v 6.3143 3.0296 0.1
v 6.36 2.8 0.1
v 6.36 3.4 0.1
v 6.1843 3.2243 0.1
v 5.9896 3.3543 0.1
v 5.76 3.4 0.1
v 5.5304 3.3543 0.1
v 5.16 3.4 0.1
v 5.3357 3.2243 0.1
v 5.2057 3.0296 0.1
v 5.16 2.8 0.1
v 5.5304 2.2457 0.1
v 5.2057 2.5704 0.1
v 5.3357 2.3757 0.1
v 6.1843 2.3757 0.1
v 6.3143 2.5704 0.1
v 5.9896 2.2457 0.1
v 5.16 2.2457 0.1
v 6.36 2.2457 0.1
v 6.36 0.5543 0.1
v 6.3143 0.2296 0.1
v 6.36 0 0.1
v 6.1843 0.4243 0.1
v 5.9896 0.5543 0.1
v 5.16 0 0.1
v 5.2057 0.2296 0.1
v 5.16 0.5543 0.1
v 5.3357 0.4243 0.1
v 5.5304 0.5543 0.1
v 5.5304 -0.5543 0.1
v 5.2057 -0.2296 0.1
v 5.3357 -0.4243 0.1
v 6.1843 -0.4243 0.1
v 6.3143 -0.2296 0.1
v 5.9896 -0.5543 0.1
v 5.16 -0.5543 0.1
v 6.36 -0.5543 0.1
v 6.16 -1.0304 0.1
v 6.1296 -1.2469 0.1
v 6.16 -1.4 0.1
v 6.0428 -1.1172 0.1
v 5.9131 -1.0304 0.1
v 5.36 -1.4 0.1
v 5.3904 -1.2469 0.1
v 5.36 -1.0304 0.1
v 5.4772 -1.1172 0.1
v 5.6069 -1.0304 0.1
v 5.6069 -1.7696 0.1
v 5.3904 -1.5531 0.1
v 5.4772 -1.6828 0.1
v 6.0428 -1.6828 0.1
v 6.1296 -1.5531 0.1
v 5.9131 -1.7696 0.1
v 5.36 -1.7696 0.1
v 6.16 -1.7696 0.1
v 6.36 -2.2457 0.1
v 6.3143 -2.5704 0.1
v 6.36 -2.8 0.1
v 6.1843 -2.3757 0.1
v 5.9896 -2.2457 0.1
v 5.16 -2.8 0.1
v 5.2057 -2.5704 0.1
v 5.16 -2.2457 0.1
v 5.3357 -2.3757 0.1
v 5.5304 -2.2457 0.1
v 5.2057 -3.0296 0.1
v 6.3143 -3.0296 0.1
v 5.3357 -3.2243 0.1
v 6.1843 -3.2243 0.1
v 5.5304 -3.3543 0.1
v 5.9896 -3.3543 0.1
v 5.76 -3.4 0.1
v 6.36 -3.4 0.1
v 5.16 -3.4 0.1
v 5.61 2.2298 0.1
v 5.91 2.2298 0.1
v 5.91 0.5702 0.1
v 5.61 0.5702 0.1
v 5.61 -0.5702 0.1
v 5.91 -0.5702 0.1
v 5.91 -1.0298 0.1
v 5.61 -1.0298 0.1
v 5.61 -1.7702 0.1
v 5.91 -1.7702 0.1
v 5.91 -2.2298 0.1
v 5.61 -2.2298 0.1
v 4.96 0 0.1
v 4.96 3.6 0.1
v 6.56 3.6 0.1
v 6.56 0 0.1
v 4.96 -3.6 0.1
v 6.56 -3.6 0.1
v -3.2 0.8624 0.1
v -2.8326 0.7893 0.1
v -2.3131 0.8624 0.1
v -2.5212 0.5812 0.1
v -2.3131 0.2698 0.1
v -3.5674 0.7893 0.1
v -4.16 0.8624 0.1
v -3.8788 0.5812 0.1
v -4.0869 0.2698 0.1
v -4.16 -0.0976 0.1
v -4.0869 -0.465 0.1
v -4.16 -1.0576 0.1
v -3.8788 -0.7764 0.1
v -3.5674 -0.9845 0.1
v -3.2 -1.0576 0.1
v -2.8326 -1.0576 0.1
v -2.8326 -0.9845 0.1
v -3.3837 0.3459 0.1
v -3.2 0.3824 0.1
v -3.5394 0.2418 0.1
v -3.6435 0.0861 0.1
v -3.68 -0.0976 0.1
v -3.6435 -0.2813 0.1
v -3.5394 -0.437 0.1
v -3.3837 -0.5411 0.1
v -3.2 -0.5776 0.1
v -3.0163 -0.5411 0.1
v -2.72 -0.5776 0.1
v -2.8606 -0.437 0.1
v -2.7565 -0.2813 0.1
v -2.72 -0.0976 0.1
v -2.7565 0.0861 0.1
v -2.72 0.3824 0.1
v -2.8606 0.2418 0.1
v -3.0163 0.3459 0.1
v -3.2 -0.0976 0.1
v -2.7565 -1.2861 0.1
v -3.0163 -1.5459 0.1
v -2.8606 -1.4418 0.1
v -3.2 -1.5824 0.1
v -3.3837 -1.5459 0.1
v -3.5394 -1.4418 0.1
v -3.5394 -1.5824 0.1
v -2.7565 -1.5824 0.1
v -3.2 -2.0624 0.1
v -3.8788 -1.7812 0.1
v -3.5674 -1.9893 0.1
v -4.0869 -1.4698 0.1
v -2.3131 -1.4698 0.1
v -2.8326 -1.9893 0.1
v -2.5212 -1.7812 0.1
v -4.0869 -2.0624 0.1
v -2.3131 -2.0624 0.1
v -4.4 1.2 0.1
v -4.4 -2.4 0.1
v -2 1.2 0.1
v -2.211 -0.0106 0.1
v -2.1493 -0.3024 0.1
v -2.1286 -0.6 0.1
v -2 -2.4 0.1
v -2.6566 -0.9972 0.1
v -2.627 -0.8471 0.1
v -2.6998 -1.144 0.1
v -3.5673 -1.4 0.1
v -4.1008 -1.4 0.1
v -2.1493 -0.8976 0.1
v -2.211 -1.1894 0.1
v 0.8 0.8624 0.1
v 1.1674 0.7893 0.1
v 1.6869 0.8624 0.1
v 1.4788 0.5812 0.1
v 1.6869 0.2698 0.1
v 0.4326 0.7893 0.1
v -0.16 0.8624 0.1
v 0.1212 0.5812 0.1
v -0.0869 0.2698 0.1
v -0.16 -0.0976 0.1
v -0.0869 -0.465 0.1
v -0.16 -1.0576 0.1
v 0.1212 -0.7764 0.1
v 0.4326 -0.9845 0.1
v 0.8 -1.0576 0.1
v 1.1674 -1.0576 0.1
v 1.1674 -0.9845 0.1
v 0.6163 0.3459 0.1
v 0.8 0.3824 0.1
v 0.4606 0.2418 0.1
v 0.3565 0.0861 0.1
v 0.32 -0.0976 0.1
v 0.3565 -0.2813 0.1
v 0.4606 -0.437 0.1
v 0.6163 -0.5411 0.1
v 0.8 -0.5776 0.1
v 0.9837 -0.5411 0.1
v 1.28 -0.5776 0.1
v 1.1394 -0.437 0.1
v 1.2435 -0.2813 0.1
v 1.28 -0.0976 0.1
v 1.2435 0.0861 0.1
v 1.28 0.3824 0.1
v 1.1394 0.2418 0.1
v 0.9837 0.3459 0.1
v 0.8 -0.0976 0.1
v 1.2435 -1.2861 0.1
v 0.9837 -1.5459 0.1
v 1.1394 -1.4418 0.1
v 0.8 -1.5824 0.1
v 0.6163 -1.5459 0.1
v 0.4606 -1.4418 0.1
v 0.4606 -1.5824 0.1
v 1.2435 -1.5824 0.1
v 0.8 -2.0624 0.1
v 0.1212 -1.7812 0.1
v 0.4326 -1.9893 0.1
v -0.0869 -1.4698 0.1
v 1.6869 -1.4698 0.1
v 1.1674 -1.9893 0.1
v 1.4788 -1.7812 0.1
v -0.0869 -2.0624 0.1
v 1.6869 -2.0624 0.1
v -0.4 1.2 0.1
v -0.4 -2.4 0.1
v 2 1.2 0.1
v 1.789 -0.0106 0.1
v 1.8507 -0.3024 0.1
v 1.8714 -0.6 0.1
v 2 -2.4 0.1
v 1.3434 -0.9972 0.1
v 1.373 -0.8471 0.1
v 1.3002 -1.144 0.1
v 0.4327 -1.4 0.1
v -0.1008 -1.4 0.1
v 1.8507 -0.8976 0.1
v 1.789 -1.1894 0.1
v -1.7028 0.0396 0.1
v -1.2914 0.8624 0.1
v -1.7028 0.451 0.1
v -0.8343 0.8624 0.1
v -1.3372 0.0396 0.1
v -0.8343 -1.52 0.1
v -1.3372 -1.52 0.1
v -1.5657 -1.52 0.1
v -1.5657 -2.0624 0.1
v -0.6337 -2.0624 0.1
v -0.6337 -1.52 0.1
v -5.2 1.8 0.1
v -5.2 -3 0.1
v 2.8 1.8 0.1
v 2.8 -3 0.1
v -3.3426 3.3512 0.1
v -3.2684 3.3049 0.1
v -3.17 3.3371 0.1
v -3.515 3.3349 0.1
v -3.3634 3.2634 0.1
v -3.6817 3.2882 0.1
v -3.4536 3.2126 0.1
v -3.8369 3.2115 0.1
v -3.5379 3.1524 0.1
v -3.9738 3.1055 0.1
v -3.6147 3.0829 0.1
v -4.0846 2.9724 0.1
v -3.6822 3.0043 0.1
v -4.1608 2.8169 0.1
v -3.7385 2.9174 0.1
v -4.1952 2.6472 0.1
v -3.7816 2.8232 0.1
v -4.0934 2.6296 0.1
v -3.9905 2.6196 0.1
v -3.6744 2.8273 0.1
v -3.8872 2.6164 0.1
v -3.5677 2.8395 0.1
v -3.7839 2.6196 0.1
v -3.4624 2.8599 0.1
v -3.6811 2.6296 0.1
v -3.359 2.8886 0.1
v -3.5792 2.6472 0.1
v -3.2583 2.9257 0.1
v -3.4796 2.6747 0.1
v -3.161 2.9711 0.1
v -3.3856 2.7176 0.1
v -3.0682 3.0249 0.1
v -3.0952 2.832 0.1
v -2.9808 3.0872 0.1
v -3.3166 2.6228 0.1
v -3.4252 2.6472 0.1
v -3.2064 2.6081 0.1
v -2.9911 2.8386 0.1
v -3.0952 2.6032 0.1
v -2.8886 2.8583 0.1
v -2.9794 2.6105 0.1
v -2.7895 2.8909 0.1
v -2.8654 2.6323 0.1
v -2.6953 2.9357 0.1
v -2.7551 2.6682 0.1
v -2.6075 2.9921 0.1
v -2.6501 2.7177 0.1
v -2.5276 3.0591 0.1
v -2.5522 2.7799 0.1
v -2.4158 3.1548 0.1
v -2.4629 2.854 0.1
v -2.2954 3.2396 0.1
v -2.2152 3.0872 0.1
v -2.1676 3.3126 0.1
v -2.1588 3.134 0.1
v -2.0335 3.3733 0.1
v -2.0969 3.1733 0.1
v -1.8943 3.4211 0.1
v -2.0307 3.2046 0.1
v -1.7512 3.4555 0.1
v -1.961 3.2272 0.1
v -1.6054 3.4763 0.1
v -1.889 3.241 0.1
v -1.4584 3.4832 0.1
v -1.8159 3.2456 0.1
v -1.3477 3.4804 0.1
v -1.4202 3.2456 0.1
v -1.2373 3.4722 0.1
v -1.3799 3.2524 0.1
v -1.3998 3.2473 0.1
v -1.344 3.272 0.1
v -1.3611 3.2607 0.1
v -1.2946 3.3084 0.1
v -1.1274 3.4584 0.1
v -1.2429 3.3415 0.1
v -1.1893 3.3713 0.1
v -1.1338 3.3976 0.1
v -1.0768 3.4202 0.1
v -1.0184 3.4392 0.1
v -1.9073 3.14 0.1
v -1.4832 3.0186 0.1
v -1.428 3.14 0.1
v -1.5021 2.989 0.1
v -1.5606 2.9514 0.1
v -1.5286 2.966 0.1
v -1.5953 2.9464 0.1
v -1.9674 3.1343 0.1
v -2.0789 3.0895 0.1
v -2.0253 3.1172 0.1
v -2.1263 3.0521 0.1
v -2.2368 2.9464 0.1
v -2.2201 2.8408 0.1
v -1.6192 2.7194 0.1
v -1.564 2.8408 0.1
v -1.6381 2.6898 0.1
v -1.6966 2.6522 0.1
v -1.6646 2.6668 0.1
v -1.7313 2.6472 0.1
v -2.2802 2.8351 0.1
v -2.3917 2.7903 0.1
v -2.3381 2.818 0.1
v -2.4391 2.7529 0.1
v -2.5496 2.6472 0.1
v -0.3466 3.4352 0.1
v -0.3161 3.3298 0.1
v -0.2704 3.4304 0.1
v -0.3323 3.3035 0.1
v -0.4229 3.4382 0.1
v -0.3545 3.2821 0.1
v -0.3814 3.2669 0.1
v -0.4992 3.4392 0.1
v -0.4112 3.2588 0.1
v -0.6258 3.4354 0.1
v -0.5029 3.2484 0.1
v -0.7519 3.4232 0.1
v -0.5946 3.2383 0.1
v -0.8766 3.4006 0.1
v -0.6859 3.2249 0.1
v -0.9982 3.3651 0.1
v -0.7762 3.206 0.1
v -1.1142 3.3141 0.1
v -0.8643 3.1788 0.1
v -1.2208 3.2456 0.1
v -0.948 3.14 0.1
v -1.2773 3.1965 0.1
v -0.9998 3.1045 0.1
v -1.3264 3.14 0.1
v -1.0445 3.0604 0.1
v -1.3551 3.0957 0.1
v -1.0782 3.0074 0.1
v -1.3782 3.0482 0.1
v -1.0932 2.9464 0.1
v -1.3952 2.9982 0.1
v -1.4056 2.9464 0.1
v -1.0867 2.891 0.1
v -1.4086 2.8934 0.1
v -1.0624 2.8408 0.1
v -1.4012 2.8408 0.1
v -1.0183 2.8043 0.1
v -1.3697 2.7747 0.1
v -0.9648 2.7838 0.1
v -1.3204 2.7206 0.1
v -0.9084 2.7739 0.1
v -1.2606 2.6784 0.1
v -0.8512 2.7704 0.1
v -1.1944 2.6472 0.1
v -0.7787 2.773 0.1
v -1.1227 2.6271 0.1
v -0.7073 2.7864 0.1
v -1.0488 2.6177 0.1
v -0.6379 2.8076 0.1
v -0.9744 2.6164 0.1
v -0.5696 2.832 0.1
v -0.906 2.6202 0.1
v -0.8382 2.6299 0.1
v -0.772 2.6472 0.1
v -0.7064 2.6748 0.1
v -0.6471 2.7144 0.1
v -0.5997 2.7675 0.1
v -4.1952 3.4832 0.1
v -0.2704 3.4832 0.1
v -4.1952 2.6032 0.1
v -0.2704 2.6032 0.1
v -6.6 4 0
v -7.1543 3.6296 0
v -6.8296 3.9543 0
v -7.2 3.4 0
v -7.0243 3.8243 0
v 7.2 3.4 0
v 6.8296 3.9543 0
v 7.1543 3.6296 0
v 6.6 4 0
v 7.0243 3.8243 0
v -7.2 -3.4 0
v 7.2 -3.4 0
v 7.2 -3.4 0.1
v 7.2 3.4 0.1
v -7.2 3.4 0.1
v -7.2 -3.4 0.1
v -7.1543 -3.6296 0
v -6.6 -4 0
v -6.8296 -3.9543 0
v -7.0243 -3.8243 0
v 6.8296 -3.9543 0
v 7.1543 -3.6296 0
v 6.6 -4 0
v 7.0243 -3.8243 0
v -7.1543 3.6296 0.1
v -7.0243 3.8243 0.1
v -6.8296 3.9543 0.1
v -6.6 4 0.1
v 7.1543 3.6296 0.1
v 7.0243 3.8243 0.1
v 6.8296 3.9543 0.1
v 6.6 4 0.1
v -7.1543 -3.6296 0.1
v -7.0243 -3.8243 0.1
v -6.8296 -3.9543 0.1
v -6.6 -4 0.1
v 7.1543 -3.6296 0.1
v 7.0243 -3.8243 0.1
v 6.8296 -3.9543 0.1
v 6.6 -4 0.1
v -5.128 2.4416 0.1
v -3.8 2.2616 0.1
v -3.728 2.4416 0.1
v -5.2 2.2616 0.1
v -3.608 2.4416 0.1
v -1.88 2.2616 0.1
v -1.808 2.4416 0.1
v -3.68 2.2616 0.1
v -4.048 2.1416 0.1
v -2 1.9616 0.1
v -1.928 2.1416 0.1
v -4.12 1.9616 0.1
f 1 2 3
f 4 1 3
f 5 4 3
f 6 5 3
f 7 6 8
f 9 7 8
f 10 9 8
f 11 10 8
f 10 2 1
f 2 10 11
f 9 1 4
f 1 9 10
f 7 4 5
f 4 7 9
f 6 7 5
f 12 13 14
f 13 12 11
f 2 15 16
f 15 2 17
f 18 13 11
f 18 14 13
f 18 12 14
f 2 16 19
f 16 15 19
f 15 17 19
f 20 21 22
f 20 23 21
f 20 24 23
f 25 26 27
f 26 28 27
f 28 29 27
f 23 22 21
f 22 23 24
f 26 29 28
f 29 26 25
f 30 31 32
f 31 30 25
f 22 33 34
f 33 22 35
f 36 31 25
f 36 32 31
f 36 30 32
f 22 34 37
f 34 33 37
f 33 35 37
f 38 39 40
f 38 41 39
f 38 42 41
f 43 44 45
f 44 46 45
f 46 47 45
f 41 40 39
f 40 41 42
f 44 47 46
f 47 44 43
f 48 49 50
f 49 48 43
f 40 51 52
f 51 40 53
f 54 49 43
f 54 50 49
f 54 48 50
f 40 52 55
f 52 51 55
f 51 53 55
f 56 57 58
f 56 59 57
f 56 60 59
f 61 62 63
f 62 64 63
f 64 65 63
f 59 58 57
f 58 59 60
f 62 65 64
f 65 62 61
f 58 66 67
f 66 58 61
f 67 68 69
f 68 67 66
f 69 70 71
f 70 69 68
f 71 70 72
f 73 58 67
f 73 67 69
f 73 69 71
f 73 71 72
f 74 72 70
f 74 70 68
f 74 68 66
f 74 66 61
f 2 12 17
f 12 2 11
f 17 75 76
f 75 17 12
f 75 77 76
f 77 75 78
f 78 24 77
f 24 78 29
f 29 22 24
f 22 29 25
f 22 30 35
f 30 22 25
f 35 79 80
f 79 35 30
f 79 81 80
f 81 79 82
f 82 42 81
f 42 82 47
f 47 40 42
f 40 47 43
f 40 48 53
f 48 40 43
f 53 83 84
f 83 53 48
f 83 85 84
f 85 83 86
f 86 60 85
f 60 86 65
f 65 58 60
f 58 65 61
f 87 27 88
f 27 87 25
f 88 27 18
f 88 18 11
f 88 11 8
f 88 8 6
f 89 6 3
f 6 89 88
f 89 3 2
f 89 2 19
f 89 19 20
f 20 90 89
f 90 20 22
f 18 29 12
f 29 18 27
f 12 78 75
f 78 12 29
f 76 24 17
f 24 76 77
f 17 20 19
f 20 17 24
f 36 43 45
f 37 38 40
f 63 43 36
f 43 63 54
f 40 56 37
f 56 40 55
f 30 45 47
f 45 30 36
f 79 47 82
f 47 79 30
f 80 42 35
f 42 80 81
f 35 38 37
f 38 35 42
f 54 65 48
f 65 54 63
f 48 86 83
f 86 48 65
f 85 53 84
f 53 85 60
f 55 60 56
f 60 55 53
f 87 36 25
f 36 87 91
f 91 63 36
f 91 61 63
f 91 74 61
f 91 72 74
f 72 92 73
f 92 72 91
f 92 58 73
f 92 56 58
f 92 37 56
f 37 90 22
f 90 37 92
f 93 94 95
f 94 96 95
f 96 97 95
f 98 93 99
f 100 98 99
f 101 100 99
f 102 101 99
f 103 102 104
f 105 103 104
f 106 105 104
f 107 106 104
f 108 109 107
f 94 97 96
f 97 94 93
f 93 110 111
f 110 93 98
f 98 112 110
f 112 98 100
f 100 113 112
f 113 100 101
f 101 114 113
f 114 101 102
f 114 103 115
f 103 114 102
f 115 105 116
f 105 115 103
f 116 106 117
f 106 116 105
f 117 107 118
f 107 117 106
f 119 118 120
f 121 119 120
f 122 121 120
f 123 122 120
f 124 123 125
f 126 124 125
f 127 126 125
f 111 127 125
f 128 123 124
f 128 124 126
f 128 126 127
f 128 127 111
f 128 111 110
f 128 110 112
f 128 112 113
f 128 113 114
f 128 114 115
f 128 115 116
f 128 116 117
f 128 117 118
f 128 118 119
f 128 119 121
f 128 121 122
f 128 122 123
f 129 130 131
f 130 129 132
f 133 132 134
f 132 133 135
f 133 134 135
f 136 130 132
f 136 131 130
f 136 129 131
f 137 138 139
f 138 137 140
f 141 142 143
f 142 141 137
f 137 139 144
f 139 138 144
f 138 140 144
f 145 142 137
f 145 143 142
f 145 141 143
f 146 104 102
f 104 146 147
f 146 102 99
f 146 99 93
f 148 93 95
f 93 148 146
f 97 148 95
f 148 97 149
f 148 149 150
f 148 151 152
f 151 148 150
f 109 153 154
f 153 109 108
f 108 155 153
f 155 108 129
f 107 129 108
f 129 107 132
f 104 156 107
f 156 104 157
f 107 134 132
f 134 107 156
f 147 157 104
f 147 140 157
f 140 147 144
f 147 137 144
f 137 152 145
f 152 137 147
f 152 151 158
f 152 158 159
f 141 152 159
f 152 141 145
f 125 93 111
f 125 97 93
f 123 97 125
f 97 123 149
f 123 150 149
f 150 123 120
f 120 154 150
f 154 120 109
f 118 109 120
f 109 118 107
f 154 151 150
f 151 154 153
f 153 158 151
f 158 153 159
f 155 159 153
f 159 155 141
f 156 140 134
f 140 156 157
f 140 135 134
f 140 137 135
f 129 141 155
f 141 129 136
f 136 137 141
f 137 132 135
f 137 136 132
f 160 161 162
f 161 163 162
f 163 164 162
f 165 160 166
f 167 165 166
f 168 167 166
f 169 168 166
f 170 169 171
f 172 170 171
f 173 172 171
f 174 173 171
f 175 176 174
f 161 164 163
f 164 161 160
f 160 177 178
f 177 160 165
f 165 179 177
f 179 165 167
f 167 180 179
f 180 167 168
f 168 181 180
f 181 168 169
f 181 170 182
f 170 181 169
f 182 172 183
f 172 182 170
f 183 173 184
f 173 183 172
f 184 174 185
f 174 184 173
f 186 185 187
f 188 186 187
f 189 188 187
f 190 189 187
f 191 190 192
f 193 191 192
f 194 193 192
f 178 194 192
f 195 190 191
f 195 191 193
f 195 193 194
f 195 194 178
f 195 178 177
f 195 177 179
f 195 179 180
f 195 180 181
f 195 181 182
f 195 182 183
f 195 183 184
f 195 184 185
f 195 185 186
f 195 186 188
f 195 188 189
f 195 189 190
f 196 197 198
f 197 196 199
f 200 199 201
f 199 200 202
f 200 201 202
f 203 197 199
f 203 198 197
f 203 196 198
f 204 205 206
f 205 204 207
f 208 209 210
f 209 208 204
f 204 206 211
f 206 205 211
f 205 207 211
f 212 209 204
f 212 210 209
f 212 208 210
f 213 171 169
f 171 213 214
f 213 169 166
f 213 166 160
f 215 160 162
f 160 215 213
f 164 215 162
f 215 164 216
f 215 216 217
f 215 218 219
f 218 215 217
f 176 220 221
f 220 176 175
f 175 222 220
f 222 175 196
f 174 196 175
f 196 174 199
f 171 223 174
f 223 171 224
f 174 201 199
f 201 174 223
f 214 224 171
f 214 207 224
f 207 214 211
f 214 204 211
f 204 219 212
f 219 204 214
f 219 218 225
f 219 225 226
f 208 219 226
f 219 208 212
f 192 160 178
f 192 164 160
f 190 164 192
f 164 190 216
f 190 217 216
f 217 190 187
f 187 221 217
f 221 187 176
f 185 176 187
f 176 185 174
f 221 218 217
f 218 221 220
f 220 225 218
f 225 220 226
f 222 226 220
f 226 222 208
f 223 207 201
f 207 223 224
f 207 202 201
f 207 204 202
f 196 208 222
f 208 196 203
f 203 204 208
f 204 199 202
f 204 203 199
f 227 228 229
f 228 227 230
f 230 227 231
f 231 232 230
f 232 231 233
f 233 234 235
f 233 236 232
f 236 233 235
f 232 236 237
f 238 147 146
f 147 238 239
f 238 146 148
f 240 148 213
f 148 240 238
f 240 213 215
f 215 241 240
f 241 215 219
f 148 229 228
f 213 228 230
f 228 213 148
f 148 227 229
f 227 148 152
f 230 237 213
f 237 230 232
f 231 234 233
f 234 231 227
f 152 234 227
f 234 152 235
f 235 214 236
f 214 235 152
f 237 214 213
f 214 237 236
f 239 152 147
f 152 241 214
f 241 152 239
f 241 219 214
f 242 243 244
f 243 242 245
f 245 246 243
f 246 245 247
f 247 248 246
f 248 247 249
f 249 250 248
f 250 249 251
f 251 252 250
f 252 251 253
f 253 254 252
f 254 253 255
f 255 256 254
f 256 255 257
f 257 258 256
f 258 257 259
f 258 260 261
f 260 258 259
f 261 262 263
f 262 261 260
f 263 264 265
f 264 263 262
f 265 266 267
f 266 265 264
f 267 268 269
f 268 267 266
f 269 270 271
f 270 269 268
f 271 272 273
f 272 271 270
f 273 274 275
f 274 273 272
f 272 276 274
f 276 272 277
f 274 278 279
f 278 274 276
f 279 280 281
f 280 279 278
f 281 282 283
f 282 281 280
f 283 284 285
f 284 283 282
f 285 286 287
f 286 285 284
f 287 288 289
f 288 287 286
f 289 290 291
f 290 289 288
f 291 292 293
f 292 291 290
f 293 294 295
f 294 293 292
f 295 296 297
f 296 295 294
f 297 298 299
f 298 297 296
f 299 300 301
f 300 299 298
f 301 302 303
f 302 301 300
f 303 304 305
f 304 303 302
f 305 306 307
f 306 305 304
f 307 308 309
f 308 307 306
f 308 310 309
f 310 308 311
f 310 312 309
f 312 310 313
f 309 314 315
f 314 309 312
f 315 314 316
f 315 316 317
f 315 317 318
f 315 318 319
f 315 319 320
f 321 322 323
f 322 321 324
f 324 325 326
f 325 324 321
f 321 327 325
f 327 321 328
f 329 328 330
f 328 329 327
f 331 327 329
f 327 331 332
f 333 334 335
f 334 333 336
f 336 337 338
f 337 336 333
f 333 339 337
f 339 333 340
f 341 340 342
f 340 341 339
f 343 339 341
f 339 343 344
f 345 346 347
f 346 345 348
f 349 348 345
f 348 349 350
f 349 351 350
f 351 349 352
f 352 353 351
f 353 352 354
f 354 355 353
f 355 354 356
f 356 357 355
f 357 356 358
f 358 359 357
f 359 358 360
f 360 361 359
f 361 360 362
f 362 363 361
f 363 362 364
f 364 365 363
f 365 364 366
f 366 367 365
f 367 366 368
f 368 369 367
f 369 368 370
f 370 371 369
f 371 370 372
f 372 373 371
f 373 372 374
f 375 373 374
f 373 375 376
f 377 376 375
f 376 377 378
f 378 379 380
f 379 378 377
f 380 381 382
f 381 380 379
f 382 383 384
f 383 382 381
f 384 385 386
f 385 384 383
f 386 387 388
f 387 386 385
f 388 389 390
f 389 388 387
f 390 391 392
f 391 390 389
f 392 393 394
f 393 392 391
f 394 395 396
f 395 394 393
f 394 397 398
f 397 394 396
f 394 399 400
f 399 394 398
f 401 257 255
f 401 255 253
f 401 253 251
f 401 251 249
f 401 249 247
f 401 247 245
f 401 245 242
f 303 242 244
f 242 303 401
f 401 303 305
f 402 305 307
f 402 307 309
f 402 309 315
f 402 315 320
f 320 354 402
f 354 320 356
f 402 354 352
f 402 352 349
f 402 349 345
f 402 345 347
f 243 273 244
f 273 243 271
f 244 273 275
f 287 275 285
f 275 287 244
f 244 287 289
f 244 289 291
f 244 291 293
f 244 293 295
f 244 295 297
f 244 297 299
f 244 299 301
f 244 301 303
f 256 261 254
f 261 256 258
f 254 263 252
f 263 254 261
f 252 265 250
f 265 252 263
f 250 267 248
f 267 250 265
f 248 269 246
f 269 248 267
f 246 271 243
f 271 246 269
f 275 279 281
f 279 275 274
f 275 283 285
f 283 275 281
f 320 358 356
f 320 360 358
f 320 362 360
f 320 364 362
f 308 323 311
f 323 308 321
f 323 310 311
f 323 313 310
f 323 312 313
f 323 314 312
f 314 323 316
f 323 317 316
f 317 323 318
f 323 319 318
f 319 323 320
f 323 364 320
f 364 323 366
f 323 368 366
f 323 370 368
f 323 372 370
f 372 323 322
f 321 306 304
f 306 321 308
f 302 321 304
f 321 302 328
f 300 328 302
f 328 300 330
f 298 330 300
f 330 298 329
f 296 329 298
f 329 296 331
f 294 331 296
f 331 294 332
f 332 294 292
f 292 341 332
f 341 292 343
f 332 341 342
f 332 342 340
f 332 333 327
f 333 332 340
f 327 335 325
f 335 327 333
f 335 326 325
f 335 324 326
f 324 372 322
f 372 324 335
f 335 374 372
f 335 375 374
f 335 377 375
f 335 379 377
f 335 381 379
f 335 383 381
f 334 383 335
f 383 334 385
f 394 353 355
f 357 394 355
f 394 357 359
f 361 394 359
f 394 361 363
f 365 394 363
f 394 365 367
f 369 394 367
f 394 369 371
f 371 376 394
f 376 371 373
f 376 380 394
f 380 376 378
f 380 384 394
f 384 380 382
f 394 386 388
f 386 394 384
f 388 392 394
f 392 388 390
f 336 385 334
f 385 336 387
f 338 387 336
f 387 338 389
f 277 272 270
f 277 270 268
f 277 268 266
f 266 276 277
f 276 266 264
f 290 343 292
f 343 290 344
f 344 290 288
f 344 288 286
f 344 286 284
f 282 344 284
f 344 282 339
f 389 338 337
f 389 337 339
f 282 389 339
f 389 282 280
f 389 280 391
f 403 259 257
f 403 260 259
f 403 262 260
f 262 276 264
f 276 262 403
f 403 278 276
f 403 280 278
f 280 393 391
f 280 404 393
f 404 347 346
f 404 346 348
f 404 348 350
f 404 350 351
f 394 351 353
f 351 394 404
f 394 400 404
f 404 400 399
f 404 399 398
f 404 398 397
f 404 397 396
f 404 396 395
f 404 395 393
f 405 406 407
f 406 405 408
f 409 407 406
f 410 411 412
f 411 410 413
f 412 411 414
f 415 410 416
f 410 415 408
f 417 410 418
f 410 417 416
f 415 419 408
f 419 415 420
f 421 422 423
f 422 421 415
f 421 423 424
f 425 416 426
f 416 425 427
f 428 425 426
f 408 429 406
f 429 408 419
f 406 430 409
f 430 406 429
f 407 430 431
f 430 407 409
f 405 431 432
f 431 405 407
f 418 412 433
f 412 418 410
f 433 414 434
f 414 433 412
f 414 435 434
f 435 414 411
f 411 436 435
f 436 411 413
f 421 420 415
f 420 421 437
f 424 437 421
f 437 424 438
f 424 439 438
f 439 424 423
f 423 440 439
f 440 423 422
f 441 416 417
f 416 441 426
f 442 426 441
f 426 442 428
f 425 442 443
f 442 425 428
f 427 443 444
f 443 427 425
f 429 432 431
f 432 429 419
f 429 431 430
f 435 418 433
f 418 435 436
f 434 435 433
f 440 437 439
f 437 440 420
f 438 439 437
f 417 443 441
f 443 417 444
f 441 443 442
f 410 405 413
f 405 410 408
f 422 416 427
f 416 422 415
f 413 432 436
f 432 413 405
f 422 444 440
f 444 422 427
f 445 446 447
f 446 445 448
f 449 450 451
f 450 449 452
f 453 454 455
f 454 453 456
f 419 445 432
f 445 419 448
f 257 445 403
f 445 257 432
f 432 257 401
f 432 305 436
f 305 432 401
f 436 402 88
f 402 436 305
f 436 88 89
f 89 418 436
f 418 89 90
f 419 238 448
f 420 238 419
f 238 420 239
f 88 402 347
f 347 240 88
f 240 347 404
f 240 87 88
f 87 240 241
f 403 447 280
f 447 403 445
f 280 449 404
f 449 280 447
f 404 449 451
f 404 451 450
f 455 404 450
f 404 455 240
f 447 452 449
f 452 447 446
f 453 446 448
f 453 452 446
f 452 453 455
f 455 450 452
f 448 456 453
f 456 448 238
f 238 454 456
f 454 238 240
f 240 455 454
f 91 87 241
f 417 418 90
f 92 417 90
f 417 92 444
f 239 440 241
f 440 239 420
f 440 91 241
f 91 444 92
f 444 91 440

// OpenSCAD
use <../lib.scad>
use <../p/1-4chrd.scad>
use <../p/1-4cyli.scad>
use <../p/box3u12.scad>
use <../p/logo-wec-box.scad>
use <../p/logo-wec-text.scad>
use <s/6148328bss01.scad>
use <s/6148328bss02.scad>
function ldraw_lib__6148328bt() = [
// 0 Sticker  1.0 x  1.8 with White "919" in Red Square on White Background Right
// 0 Name: 6148328bt.dat
// 0 Author: Massimo Maso [Sirio]
// 0 !LDRAW_ORG Part UPDATE 2024-08
// 0 !LICENSE Licensed under CC BY 4.0 : see CAreadme.txt
// 
// 0 BFC CERTIFY CCW
  [0,"BFC","CERTIFY"],
  [0,"BFC","CCW"],
// 
// 0 !KEYWORDS 919, Bricklink 75876stk01, Brickowl 852010, Hybrid, Pit Lane
// 0 !KEYWORDS Porsche, Rebrickable 26357, set 75876, Speed Champions
// 
// 0 !HISTORY 2024-09-30 [OrionP] Official Update 2024-08
// 
// 0 // Subparts
// 1 15 14.4 -.25 0 1 0 0 0 1 0 0 0 1 s\6148328bss01.dat
  [1,15,14.4,-.25,0,1,0,0,0,1,0,0,0,1, ldraw_lib__s__6148328bss01()],
// 1 15 -3 -.25 -1.5 1 0 0 0 1 0 0 0 1 s\6148328bss02.dat
  [1,15,-3,-.25,-1.5,1,0,0,0,1,0,0,0,1, ldraw_lib__s__6148328bss02()],
// 0 // Logo primitive
// 1 0 -5.582 -.25 7.608 .22 0 0 0 1 0 0 0 .22 logo-wec-text.dat
  [1,0,-5.582,-.25,7.608,.22,0,0,0,1,0,0,0,.22, ldraw_lib__logo_wec_text()],
// 1 15 -5.582 -.25 7.608 .22 0 0 0 1 0 0 0 .22 logo-wec-box.dat
  [1,15,-5.582,-.25,7.608,.22,0,0,0,1,0,0,0,.22, ldraw_lib__logo_wec_box()],
// 0 // Primitives
// 1 16 -16.5 0 8.5 -1.5 0 0 0 -1 0 0 0 1.5 1-4chrd.dat
  [1,16,-16.5,0,8.5,-1.5,0,0,0,-1,0,0,0,1.5, ldraw_lib__1_4chrd()],
// 1 16 16.5 0 8.5 1.5 0 0 0 -1 0 0 0 1.5 1-4chrd.dat
  [1,16,16.5,0,8.5,1.5,0,0,0,-1,0,0,0,1.5, ldraw_lib__1_4chrd()],
// 1 16 0 -.25 0 0 0 18 0 .25 0 8.5 0 0 box3u12.dat
  [1,16,0,-.25,0,0,0,18,0,.25,0,8.5,0,0, ldraw_lib__box3u12()],
// 1 16 -16.5 0 -8.5 -1.5 0 0 0 -1 0 0 0 -1.5 1-4chrd.dat
  [1,16,-16.5,0,-8.5,-1.5,0,0,0,-1,0,0,0,-1.5, ldraw_lib__1_4chrd()],
// 1 16 16.5 0 -8.5 1.5 0 0 0 -1 0 0 0 -1.5 1-4chrd.dat
  [1,16,16.5,0,-8.5,1.5,0,0,0,-1,0,0,0,-1.5, ldraw_lib__1_4chrd()],
// 1 16 -16.5 0 8.5 -1.5 0 0 0 -.25 0 0 0 1.5 1-4cyli.dat
  [1,16,-16.5,0,8.5,-1.5,0,0,0,-.25,0,0,0,1.5, ldraw_lib__1_4cyli()],
// 1 16 16.5 0 8.5 1.5 0 0 0 -.25 0 0 0 1.5 1-4cyli.dat
  [1,16,16.5,0,8.5,1.5,0,0,0,-.25,0,0,0,1.5, ldraw_lib__1_4cyli()],
// 1 16 -16.5 0 -8.5 -1.5 0 0 0 -.25 0 0 0 -1.5 1-4cyli.dat
  [1,16,-16.5,0,-8.5,-1.5,0,0,0,-.25,0,0,0,-1.5, ldraw_lib__1_4cyli()],
// 1 16 16.5 0 -8.5 1.5 0 0 0 -.25 0 0 0 -1.5 1-4cyli.dat
  [1,16,16.5,0,-8.5,1.5,0,0,0,-.25,0,0,0,-1.5, ldraw_lib__1_4cyli()],
// 1 15 -16.5 -.25 8.5 -1.5 0 0 0 1 0 0 0 1.5 1-4chrd.dat
  [1,15,-16.5,-.25,8.5,-1.5,0,0,0,1,0,0,0,1.5, ldraw_lib__1_4chrd()],
// 1 15 16.5 -.25 8.5 1.5 0 0 0 1 0 0 0 1.5 1-4chrd.dat
  [1,15,16.5,-.25,8.5,1.5,0,0,0,1,0,0,0,1.5, ldraw_lib__1_4chrd()],
// 1 15 -16.5 -.25 -8.5 -1.5 0 0 0 1 0 0 0 -1.5 1-4chrd.dat
  [1,15,-16.5,-.25,-8.5,-1.5,0,0,0,1,0,0,0,-1.5, ldraw_lib__1_4chrd()],
// 1 15 16.5 -.25 -8.5 1.5 0 0 0 1 0 0 0 -1.5 1-4chrd.dat
  [1,15,16.5,-.25,-8.5,1.5,0,0,0,1,0,0,0,-1.5, ldraw_lib__1_4chrd()],
// 0 // Bottom faces
// 4 16 16.5 0 10 18 0 8.5 -18 0 8.5 -16.5 0 10
  [4,16,16.5,0,10,18,0,8.5,-18,0,8.5,-16.5,0,10],
// 4 16 16.5 0 -10 -16.5 0 -10 -18 0 -8.5 18 0 -8.5
  [4,16,16.5,0,-10,-16.5,0,-10,-18,0,-8.5,18,0,-8.5],
// 0 // Lateral faces
// 4 16 -16.5 0 10 -16.5 -.25 10 16.5 -.25 10 16.5 0 10
  [4,16,-16.5,0,10,-16.5,-.25,10,16.5,-.25,10,16.5,0,10],
// 4 16 -16.5 0 -10 16.5 0 -10 16.5 -.25 -10 -16.5 -.25 -10
  [4,16,-16.5,0,-10,16.5,0,-10,16.5,-.25,-10,-16.5,-.25,-10],
// 0 // Top faces
// 0 // Black faces
// 4 0 -12.82 -.25 6.104 -13 -.25 5.654 -9.5 -.25 5.654 -9.32 -.25 6.104
  [4,0,-12.82,-.25,6.104,-13,-.25,5.654,-9.5,-.25,5.654,-9.32,-.25,6.104],
// 4 0 -9.02 -.25 6.104 -9.2 -.25 5.654 -4.7 -.25 5.654 -4.52 -.25 6.104
  [4,0,-9.02,-.25,6.104,-9.2,-.25,5.654,-4.7,-.25,5.654,-4.52,-.25,6.104],
// 4 0 -10.12 -.25 5.354 -10.3 -.25 4.904 -5 -.25 4.904 -4.82 -.25 5.354
  [4,0,-10.12,-.25,5.354,-10.3,-.25,4.904,-5,-.25,4.904,-4.82,-.25,5.354],
// 0 // White faces
// 4 15 -16.5 -.25 10 -18 -.25 8.5 -13 -.25 5.654 -12.82 -.25 6.104
  [4,15,-16.5,-.25,10,-18,-.25,8.5,-13,-.25,5.654,-12.82,-.25,6.104],
// 4 15 -16.5 -.25 10 -12.82 -.25 6.104 -10.488 -.25 6.508 -10.488 -.25 6.618
  [4,15,-16.5,-.25,10,-12.82,-.25,6.104,-10.488,-.25,6.508,-10.488,-.25,6.618],
// 3 15 -16.5 -.25 10 -10.488 -.25 6.618 -10.488 -.25 8.708
  [3,15,-16.5,-.25,10,-10.488,-.25,6.618,-10.488,-.25,8.708],
// 4 15 -16.5 -.25 10 -10.488 -.25 8.708 -3.646 -.25 8.708 16.5 -.25 10
  [4,15,-16.5,-.25,10,-10.488,-.25,8.708,-3.646,-.25,8.708,16.5,-.25,10],
// 4 15 16.5 -.25 10 -3.646 -.25 8.708 -.676 -.25 8.708 12.4 -.25 9
  [4,15,16.5,-.25,10,-3.646,-.25,8.708,-.676,-.25,8.708,12.4,-.25,9],
// 3 15 16.5 -.25 10 12.4 -.25 9 16.4 -.25 9
  [3,15,16.5,-.25,10,12.4,-.25,9,16.4,-.25,9],
// 4 15 16.5 -.25 10 16.4 -.25 9 16.4 -.25 0 18 -.25 8.5
  [4,15,16.5,-.25,10,16.4,-.25,9,16.4,-.25,0,18,-.25,8.5],
// 3 15 -18 -.25 8.5 -13 -.25 4.5 -13 -.25 5.654
  [3,15,-18,-.25,8.5,-13,-.25,4.5,-13,-.25,5.654],
// 4 15 -18 -.25 8.5 -18 -.25 -8.5 -13 -.25 -7.5 -13 -.25 4.5
  [4,15,-18,-.25,8.5,-18,-.25,-8.5,-13,-.25,-7.5,-13,-.25,4.5],
// 3 15 12.4 -.25 9 -.676 -.25 8.708 -.676 -.25 8.576
  [3,15,12.4,-.25,9,-.676,-.25,8.708,-.676,-.25,8.576],
// 4 15 12.4 -.25 9 -.676 -.25 8.576 -.676 -.25 6.508 7 -.25 4.5
  [4,15,12.4,-.25,9,-.676,-.25,8.576,-.676,-.25,6.508,7,-.25,4.5],
// 4 15 12.4 -.25 9 7 -.25 4.5 7 -.25 -7.5 12.4 -.25 0
  [4,15,12.4,-.25,9,7,-.25,4.5,7,-.25,-7.5,12.4,-.25,0],
// 4 15 -10.488 -.25 6.508 -12.82 -.25 6.104 -9.32 -.25 6.104 -7.738 -.25 6.508
  [4,15,-10.488,-.25,6.508,-12.82,-.25,6.104,-9.32,-.25,6.104,-7.738,-.25,6.508],
// 4 15 -7.738 -.25 6.508 -9.32 -.25 6.104 -9.02 -.25 6.104 -.676 -.25 6.508
  [4,15,-7.738,-.25,6.508,-9.32,-.25,6.104,-9.02,-.25,6.104,-.676,-.25,6.508],
// 3 15 -.676 -.25 6.508 -9.02 -.25 6.104 -4.52 -.25 6.104
  [3,15,-.676,-.25,6.508,-9.02,-.25,6.104,-4.52,-.25,6.104],
// 3 15 -.676 -.25 6.508 -4.52 -.25 6.104 -4.7 -.25 5.654
  [3,15,-.676,-.25,6.508,-4.52,-.25,6.104,-4.7,-.25,5.654],
// 4 15 -.676 -.25 6.508 -4.7 -.25 5.654 -4.82 -.25 5.354 7 -.25 4.5
  [4,15,-.676,-.25,6.508,-4.7,-.25,5.654,-4.82,-.25,5.354,7,-.25,4.5],
// 4 15 -9.32 -.25 6.104 -9.5 -.25 5.654 -9.2 -.25 5.654 -9.02 -.25 6.104
  [4,15,-9.32,-.25,6.104,-9.5,-.25,5.654,-9.2,-.25,5.654,-9.02,-.25,6.104],
// 3 15 -10.12 -.25 5.354 -9.5 -.25 5.654 -13 -.25 5.654
  [3,15,-10.12,-.25,5.354,-9.5,-.25,5.654,-13,-.25,5.654],
// 4 15 -10.12 -.25 5.354 -4.82 -.25 5.354 -9.2 -.25 5.654 -9.5 -.25 5.654
  [4,15,-10.12,-.25,5.354,-4.82,-.25,5.354,-9.2,-.25,5.654,-9.5,-.25,5.654],
// 3 15 -4.82 -.25 5.354 -4.7 -.25 5.654 -9.2 -.25 5.654
  [3,15,-4.82,-.25,5.354,-4.7,-.25,5.654,-9.2,-.25,5.654],
// 4 15 -13 -.25 4.5 -10.3 -.25 4.904 -10.12 -.25 5.354 -13 -.25 5.654
  [4,15,-13,-.25,4.5,-10.3,-.25,4.904,-10.12,-.25,5.354,-13,-.25,5.654],
// 4 15 -13 -.25 4.5 7 -.25 4.5 -5 -.25 4.904 -10.3 -.25 4.904
  [4,15,-13,-.25,4.5,7,-.25,4.5,-5,-.25,4.904,-10.3,-.25,4.904],
// 3 15 7 -.25 4.5 -4.82 -.25 5.354 -5 -.25 4.904
  [3,15,7,-.25,4.5,-4.82,-.25,5.354,-5,-.25,4.904],
// 3 15 12.4 -.25 -9 12.4 -.25 0 7 -.25 -7.5
  [3,15,12.4,-.25,-9,12.4,-.25,0,7,-.25,-7.5],
// 3 15 18 -.25 -8.5 18 -.25 8.5 16.4 -.25 0
  [3,15,18,-.25,-8.5,18,-.25,8.5,16.4,-.25,0],
// 4 15 18 -.25 -8.5 16.4 -.25 0 16.4 -.25 -9 16.5 -.25 -10
  [4,15,18,-.25,-8.5,16.4,-.25,0,16.4,-.25,-9,16.5,-.25,-10],
// 4 15 -16.5 -.25 -10 7 -.25 -7.5 -13 -.25 -7.5 -18 -.25 -8.5
  [4,15,-16.5,-.25,-10,7,-.25,-7.5,-13,-.25,-7.5,-18,-.25,-8.5],
// 3 15 -16.5 -.25 -10 12.4 -.25 -9 7 -.25 -7.5
  [3,15,-16.5,-.25,-10,12.4,-.25,-9,7,-.25,-7.5],
// 4 15 -16.5 -.25 -10 16.5 -.25 -10 16.4 -.25 -9 12.4 -.25 -9
  [4,15,-16.5,-.25,-10,16.5,-.25,-10,16.4,-.25,-9,12.4,-.25,-9],
];
module ldraw_lib__6148328bt(step=0, col=false, unit=2/5, alt=false, line=0.2, solid=!$preview)
    makepoly(ldraw_lib__6148328bt(), step=step, col=col, unit=unit, alt=alt, line=line, solid=solid);
ldraw_lib__6148328bt(line=0.2);
